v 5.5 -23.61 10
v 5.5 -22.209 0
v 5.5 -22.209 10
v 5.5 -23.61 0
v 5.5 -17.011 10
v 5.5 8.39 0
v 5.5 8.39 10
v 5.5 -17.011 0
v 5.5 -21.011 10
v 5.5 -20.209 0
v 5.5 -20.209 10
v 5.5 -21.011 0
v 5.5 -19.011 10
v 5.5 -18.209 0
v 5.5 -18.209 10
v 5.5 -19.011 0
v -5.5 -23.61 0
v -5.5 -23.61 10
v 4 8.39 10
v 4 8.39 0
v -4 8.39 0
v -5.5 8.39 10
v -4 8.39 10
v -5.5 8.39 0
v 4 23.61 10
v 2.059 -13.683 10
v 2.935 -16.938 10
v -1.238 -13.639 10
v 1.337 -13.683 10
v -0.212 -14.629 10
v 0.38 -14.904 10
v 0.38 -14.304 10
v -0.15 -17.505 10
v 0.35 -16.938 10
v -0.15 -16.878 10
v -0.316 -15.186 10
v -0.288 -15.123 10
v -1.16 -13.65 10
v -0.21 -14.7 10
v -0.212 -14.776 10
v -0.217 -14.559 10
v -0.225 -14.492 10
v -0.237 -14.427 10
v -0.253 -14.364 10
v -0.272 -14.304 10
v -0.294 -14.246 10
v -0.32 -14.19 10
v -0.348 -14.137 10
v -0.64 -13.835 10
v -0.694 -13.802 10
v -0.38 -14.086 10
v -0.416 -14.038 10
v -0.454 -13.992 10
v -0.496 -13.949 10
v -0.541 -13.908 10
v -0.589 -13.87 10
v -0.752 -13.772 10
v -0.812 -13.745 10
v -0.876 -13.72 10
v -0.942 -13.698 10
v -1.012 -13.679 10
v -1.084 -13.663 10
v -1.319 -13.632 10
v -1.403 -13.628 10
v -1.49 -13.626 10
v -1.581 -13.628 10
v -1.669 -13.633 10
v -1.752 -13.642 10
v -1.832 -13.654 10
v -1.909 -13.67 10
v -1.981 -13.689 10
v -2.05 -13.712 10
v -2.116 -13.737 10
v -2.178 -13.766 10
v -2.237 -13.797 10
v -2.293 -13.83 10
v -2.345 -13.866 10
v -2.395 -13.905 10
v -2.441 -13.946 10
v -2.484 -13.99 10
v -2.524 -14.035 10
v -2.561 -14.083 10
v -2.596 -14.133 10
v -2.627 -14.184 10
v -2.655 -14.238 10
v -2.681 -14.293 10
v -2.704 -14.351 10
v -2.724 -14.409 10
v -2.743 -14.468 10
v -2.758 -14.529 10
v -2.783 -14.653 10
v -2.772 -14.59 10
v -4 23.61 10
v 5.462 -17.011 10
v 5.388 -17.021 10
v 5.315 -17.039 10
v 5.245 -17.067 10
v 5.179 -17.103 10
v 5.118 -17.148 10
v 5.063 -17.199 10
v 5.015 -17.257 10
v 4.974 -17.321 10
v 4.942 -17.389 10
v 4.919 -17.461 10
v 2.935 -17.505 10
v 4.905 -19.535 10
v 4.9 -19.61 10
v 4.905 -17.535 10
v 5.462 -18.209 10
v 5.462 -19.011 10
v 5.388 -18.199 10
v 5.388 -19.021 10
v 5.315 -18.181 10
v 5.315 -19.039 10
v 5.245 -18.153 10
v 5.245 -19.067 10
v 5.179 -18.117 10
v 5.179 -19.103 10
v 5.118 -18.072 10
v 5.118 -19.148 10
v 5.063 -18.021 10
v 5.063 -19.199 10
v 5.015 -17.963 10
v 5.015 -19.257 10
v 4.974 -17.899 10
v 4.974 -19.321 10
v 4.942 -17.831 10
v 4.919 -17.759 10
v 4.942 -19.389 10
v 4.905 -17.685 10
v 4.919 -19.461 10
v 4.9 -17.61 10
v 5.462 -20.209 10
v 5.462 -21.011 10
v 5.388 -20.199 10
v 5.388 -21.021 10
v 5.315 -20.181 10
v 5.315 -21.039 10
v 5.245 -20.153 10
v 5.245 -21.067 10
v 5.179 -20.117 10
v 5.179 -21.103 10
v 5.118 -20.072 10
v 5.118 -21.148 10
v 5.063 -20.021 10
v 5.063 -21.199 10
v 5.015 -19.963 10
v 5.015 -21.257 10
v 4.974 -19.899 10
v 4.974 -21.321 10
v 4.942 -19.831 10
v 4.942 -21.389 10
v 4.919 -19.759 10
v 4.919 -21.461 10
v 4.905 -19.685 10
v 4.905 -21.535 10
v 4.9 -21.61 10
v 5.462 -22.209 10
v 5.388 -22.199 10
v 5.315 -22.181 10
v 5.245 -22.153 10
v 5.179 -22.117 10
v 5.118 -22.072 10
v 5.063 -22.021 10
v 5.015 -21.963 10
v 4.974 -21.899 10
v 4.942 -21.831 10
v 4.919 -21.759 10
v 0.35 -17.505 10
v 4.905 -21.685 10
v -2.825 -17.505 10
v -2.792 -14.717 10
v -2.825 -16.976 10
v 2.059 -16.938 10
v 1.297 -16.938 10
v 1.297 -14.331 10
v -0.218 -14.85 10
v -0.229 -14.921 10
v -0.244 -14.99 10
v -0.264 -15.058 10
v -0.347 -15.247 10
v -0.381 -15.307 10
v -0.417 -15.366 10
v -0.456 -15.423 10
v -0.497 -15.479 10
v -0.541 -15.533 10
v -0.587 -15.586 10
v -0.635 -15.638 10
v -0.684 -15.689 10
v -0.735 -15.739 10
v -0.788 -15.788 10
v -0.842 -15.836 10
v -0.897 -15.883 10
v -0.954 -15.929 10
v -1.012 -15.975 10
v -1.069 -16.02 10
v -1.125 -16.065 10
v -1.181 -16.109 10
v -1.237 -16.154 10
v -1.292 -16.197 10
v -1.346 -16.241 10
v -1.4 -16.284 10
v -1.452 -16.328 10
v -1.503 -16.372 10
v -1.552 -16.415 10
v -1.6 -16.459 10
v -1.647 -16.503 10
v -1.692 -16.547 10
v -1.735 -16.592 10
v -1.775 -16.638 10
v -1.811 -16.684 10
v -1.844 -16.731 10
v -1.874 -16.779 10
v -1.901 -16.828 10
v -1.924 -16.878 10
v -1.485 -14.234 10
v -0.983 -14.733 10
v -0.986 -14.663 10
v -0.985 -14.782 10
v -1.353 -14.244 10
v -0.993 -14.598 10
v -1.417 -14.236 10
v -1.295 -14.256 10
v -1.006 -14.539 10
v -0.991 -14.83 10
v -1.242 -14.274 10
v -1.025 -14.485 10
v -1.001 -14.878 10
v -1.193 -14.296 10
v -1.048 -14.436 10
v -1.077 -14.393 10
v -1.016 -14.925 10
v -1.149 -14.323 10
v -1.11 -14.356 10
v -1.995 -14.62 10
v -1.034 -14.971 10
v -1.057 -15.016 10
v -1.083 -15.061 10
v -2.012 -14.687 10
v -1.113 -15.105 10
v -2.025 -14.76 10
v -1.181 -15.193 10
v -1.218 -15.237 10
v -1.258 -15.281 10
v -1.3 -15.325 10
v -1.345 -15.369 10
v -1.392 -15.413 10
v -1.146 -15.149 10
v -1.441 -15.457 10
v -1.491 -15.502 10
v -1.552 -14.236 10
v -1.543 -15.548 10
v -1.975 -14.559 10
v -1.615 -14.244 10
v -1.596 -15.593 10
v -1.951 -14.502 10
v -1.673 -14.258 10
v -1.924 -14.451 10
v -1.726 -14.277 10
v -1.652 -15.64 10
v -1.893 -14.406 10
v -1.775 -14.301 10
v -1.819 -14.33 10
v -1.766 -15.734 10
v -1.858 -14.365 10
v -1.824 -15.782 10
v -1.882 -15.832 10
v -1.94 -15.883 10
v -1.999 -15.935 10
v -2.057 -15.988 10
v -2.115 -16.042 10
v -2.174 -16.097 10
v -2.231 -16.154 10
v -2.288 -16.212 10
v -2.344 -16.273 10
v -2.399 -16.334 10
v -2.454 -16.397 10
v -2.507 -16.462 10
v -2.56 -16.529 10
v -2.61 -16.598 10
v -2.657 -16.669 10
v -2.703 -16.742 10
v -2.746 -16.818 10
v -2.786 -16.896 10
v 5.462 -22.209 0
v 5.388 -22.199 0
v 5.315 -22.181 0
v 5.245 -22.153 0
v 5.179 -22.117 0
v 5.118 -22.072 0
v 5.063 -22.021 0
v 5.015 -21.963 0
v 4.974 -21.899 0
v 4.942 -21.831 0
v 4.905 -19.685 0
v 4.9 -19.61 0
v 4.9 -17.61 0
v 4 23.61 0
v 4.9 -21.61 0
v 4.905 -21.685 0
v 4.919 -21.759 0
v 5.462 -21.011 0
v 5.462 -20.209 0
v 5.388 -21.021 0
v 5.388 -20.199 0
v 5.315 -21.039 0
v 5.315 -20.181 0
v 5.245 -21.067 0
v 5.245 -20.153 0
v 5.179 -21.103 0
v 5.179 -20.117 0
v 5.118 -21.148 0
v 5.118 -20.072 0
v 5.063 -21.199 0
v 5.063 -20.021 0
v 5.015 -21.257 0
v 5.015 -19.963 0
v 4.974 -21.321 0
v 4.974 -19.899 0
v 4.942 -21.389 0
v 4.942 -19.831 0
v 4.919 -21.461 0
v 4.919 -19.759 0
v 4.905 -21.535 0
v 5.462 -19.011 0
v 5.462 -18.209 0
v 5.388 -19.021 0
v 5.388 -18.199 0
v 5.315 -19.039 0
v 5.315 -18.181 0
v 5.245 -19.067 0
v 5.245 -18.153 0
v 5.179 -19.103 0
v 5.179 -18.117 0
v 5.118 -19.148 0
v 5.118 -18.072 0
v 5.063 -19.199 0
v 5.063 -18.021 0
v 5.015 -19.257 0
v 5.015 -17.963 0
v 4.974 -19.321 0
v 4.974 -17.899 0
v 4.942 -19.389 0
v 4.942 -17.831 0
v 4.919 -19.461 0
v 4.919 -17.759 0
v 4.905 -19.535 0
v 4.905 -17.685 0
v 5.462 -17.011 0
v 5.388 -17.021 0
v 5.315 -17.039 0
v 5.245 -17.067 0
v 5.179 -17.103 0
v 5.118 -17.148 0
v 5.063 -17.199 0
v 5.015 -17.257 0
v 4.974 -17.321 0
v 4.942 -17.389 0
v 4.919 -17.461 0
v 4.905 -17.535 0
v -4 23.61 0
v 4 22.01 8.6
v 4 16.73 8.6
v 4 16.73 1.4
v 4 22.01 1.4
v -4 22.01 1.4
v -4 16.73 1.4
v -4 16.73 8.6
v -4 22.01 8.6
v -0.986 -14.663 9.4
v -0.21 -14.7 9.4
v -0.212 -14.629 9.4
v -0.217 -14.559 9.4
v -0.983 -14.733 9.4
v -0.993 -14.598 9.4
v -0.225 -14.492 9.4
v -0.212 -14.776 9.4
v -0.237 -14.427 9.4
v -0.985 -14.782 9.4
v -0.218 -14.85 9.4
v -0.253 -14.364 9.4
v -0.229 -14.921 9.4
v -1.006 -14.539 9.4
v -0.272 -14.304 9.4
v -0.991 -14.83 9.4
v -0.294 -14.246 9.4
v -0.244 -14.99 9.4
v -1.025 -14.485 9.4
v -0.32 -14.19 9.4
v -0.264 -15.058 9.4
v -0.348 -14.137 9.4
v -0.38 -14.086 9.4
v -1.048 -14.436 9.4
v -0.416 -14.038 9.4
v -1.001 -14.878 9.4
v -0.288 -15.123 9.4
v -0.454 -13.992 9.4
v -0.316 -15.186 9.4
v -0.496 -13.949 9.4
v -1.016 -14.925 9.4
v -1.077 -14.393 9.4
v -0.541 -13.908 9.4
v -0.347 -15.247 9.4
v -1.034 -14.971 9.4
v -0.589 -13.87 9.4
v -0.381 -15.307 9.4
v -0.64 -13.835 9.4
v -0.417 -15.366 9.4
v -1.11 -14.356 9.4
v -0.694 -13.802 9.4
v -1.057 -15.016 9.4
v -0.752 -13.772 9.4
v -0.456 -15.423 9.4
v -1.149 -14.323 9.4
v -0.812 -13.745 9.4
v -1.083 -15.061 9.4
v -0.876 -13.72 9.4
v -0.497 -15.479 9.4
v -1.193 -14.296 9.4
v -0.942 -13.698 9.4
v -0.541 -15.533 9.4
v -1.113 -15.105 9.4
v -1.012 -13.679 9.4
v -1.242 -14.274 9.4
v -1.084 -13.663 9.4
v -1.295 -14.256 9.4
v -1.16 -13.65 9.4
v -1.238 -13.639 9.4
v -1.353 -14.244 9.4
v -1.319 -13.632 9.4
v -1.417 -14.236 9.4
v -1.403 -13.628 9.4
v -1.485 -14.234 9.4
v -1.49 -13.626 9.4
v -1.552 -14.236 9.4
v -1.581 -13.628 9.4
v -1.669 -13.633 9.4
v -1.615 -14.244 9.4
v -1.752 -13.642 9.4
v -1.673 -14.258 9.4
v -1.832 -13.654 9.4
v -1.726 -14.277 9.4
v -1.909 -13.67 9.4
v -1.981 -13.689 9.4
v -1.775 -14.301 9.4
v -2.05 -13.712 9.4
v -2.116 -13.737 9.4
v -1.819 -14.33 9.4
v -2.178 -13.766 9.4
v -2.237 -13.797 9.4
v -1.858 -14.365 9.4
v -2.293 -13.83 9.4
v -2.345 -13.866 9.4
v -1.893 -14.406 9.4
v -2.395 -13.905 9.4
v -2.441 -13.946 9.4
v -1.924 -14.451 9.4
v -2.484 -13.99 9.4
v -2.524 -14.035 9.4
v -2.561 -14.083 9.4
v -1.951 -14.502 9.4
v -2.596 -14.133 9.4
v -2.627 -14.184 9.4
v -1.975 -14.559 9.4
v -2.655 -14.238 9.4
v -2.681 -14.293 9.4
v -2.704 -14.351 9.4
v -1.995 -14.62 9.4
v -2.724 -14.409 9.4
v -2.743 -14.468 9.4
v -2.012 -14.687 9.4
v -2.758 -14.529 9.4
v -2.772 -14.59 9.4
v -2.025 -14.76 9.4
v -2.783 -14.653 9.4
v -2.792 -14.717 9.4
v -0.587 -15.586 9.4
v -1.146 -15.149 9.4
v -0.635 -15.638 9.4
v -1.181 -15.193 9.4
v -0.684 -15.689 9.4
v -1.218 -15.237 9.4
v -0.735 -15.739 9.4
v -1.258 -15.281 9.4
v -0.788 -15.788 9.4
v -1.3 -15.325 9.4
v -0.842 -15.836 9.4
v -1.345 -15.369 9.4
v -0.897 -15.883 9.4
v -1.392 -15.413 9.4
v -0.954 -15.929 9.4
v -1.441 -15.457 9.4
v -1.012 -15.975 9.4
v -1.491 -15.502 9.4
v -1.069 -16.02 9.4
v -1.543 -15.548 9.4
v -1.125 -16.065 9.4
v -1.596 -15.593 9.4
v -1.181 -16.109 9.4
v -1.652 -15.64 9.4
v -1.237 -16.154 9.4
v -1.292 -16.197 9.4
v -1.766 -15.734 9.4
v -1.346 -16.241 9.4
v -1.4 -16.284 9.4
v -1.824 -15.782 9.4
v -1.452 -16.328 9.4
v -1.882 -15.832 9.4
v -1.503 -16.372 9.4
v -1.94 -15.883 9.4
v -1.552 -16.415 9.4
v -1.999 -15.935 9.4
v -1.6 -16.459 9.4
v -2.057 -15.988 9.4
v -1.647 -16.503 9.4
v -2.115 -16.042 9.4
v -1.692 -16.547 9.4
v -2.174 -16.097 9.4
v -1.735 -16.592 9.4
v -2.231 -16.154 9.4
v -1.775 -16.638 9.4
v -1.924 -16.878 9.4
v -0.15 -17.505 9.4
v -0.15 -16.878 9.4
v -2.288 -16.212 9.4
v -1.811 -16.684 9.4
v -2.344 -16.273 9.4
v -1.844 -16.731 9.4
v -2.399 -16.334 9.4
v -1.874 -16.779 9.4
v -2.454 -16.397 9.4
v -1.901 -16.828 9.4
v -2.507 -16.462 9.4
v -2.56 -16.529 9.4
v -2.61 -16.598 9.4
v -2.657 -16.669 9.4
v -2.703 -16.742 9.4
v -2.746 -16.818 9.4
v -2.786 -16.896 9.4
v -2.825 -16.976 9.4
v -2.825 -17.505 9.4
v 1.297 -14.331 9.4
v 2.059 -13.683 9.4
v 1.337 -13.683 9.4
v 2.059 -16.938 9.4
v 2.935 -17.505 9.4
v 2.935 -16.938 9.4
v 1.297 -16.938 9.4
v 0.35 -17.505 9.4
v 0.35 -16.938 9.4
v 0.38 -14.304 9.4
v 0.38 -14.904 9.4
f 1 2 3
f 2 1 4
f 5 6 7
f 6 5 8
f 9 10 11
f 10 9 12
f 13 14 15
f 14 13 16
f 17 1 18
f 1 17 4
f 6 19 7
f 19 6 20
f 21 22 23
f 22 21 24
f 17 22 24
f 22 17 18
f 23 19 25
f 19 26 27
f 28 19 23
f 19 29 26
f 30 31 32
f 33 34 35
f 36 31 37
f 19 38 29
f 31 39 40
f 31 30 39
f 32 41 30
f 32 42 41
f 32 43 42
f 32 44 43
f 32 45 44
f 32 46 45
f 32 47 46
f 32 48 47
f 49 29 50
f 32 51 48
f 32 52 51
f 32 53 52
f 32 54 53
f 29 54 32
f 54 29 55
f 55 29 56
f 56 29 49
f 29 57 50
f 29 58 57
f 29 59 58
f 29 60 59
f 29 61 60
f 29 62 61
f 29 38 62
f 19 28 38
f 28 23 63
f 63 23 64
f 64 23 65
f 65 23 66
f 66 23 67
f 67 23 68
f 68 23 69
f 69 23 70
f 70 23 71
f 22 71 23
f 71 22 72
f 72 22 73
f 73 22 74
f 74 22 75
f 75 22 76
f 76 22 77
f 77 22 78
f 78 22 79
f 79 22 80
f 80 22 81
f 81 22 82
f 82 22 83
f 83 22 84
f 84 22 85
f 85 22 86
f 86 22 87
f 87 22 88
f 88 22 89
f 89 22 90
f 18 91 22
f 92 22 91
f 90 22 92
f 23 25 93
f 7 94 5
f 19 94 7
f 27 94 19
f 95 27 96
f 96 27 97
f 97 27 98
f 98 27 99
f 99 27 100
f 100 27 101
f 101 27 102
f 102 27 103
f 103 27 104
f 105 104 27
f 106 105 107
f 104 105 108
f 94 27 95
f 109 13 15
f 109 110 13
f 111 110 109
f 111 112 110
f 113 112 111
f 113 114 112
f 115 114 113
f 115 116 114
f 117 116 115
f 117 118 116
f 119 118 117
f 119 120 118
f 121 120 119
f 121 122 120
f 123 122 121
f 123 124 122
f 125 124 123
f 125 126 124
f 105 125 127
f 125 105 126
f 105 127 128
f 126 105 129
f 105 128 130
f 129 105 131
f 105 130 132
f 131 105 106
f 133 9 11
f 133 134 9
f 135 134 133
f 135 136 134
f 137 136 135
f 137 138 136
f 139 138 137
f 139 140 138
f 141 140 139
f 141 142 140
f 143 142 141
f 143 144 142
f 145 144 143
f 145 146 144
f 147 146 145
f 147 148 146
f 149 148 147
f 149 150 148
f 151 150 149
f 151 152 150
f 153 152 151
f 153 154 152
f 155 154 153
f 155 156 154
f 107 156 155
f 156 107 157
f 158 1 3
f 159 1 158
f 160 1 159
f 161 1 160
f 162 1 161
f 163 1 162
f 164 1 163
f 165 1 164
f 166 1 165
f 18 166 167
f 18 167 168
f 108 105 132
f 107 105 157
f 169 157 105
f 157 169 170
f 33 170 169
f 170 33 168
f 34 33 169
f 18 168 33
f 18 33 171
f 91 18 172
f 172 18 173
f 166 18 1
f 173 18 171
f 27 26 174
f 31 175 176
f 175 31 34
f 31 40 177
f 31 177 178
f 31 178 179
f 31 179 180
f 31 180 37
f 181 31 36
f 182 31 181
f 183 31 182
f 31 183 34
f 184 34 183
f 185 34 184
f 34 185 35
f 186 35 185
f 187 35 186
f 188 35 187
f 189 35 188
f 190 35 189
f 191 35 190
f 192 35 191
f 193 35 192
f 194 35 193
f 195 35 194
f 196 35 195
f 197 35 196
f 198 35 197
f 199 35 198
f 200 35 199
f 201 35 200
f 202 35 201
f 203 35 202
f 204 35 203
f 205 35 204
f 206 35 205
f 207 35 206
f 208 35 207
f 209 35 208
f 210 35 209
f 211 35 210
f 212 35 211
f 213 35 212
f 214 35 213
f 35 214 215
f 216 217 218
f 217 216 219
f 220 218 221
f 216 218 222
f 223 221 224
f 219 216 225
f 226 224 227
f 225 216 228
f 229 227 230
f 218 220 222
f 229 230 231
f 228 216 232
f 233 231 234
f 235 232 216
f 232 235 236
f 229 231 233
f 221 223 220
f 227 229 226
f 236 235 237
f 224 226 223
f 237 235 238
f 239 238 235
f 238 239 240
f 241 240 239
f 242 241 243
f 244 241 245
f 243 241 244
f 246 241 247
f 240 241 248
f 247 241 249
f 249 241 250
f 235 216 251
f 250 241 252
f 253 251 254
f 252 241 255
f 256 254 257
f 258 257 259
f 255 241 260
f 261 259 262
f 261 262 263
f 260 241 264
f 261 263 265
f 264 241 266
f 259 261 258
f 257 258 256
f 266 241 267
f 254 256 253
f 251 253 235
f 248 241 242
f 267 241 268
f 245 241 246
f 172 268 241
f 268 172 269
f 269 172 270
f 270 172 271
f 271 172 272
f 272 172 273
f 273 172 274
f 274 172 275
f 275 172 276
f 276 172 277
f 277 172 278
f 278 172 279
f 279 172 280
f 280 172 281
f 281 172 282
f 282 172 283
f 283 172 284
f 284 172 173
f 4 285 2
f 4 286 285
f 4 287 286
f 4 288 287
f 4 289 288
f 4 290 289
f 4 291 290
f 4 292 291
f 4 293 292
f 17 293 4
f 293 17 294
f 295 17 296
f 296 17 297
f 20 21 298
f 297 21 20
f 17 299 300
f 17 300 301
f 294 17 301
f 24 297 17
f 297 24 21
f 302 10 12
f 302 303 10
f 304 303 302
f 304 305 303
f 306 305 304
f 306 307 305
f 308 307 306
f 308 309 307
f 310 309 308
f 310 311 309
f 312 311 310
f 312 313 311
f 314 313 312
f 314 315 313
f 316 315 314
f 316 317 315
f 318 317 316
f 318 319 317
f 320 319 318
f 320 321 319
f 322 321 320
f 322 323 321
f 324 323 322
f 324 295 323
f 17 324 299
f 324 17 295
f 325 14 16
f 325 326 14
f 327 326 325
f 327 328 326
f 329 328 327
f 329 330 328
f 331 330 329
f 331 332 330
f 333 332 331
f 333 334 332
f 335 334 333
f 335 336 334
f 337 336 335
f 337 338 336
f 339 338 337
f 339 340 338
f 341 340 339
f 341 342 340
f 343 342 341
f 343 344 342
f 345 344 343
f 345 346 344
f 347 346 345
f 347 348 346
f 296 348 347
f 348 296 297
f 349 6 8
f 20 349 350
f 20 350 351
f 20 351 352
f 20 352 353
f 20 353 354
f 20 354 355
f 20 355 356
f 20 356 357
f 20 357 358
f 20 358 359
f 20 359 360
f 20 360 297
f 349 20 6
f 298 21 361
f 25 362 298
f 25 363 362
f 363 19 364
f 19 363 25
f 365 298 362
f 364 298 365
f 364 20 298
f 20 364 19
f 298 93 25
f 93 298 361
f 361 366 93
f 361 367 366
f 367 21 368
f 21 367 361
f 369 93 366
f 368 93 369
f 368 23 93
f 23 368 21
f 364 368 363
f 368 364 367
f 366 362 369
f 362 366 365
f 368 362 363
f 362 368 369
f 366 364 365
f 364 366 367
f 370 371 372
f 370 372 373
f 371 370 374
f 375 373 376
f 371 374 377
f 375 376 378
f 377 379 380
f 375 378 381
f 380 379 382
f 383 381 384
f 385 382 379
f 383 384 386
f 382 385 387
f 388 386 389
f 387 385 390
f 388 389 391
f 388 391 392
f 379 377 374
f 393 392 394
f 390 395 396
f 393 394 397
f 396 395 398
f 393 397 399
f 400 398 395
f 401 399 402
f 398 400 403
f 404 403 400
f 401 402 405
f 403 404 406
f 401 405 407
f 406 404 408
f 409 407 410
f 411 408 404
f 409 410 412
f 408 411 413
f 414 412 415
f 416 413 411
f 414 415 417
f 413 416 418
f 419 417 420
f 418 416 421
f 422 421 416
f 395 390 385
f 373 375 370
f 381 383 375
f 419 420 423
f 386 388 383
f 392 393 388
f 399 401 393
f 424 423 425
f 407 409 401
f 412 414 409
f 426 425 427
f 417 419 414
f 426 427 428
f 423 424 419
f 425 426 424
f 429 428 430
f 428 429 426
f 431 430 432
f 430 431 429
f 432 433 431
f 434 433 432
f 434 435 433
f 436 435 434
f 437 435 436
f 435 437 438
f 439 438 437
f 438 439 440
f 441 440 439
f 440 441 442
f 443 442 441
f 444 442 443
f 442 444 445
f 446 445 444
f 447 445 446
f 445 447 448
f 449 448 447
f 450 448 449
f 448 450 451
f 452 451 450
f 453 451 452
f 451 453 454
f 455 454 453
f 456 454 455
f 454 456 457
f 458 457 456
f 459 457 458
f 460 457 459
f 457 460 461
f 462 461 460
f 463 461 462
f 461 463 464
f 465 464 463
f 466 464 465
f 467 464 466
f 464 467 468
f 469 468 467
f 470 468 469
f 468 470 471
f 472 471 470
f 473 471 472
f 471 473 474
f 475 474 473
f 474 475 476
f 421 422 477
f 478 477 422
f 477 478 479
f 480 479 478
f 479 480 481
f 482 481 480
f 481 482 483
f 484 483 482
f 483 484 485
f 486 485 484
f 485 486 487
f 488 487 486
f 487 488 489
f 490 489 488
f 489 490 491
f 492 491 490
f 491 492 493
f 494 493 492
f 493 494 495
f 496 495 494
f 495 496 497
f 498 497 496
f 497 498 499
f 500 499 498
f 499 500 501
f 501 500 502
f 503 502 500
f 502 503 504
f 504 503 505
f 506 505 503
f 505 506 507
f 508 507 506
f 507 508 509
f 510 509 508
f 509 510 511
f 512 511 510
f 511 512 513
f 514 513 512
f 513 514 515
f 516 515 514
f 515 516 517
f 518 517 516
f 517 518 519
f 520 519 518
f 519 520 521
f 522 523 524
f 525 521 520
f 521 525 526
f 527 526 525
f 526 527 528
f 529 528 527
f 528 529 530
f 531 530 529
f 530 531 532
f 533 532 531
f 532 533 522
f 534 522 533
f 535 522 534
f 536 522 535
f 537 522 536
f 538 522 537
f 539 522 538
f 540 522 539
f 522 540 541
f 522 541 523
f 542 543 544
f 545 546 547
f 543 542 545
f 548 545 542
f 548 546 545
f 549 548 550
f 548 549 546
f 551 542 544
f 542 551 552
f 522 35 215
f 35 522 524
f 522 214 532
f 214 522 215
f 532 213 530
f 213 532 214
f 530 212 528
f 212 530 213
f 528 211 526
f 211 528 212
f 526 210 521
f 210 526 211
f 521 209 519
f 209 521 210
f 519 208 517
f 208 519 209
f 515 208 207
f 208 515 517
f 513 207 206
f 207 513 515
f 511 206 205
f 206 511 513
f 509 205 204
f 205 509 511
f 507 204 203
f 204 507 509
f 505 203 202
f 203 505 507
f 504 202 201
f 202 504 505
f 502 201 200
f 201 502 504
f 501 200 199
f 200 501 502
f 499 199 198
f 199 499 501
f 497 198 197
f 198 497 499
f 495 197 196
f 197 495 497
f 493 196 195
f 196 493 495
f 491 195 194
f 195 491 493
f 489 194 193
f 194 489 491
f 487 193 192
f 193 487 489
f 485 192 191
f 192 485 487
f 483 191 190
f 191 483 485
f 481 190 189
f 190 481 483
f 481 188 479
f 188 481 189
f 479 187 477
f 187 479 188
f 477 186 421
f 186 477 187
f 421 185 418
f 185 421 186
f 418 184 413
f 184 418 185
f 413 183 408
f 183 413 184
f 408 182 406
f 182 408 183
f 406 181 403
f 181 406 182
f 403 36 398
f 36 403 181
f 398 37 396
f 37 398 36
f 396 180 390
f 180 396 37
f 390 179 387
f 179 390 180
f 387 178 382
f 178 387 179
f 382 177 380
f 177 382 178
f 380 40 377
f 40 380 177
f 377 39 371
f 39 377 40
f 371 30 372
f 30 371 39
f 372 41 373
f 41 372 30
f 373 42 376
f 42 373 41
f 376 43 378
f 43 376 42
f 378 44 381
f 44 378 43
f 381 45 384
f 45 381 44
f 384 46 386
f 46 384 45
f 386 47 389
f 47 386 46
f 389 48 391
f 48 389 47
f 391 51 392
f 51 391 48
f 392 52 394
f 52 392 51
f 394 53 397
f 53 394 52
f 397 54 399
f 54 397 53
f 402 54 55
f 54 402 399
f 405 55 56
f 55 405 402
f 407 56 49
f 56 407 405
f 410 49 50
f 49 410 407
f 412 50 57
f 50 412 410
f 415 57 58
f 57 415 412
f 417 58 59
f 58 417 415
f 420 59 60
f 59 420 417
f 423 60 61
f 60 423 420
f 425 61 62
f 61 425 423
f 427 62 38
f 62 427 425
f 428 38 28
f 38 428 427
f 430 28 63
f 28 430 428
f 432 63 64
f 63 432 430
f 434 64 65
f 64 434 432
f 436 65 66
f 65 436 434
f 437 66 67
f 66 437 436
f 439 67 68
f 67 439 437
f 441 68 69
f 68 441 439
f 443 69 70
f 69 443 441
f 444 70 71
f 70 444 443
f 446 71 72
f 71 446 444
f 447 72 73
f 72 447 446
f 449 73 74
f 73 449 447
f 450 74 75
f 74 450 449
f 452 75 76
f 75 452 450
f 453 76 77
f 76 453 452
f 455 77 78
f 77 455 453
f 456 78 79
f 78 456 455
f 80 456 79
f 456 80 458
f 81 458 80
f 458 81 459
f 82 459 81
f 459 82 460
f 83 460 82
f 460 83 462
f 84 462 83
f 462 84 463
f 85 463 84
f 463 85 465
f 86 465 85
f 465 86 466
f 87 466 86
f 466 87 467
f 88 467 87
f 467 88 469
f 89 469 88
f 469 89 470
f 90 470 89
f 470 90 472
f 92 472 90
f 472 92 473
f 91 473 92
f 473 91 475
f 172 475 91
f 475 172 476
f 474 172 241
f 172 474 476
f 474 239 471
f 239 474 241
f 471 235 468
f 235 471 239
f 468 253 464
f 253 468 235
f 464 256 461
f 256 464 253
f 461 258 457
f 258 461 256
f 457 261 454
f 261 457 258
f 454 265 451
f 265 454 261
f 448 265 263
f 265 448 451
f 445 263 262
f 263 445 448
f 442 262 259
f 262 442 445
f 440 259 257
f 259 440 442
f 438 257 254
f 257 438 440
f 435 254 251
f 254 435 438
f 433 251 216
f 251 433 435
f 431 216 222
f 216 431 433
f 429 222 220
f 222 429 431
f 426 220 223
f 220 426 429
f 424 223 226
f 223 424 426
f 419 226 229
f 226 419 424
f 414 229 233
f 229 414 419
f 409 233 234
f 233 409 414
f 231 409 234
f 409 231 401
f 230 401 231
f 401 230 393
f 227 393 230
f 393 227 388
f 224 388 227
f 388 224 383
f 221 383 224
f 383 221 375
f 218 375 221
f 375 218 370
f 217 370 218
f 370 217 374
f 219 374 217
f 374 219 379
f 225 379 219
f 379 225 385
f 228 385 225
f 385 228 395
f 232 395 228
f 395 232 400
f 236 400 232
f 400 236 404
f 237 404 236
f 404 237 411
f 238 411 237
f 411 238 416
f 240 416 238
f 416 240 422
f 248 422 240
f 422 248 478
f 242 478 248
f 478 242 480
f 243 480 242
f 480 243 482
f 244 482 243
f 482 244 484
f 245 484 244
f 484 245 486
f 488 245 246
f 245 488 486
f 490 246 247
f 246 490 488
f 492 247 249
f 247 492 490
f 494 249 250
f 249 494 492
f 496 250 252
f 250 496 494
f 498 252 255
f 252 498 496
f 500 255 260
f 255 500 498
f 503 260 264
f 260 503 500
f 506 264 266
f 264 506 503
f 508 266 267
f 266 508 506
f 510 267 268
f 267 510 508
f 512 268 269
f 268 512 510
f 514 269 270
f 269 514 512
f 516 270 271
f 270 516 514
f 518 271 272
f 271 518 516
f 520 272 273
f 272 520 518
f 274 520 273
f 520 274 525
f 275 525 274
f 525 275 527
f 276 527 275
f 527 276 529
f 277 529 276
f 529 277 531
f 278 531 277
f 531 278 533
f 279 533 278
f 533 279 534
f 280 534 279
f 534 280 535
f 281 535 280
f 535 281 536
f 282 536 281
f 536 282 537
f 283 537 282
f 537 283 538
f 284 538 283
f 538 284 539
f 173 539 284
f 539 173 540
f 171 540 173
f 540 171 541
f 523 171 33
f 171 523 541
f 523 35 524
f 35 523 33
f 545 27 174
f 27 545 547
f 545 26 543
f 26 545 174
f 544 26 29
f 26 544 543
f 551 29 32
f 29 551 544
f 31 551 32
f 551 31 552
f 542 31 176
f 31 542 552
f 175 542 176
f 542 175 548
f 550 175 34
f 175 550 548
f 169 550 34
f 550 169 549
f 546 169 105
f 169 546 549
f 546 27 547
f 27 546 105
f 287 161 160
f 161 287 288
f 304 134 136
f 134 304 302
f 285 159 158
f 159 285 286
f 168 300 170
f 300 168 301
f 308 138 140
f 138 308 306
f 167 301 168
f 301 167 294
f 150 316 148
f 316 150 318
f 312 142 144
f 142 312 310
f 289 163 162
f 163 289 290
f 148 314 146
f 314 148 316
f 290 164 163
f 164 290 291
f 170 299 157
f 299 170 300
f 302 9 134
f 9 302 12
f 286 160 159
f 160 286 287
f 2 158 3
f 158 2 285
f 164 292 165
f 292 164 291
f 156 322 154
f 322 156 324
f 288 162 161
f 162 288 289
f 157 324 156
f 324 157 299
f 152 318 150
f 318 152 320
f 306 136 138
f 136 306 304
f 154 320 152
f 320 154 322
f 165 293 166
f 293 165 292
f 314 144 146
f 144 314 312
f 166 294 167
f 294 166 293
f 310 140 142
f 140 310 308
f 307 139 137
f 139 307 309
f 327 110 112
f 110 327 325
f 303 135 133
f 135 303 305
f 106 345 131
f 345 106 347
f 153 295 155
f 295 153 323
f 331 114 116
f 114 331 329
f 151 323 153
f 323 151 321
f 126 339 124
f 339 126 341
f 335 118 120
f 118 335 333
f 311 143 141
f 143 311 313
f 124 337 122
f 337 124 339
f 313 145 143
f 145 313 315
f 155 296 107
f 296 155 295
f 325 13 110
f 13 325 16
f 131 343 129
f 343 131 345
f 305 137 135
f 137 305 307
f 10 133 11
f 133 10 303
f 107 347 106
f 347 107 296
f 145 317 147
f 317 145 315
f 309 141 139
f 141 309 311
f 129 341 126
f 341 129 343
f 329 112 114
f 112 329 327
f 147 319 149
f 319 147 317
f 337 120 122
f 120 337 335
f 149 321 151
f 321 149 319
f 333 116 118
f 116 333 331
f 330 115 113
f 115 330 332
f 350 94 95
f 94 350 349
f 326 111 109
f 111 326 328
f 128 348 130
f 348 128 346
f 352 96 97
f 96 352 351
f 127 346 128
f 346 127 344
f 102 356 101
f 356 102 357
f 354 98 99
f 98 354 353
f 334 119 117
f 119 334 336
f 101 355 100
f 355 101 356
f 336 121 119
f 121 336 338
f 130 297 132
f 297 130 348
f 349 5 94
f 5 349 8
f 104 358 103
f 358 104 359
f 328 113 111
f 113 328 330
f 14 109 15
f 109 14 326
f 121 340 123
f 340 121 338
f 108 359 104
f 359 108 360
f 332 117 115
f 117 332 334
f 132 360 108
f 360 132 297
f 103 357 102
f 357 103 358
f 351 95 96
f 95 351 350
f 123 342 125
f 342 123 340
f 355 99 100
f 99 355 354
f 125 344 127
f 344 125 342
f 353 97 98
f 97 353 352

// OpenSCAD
$fn = 50;

difference() {
	union() {
		translate(v = [0, 8.39, 0]) {
			rotate(a = [90, 0, 0]) {
				difference() {
					union() {
						translate(v = [-5.5, 0, 0]) {
							cube(size = [11.0, 10.0, 32.0]);
						}
						translate(v = [-4.0, 0, -15.22]) {
							cube(size = [8.0, 10.0, 15.32]);
						}
					}
					union() {
						translate(v = [-4.1, 1.4, -13.620000000000001]) {
							cube(size = [8.2, 7.2, 5.28]);
						}
						translate(v = [0, 9.4, 24.0]) {
							rotate(a = [-90, 0, 0]) {
								linear_extrude(height = 0.7) {
									text(font = "Arial:style=Bold", halign = "center", size = 4.0, text = "21", valign = "center");
								}
							}
						}
						translate(v = [5.5, 10.1, 30.0]) {
							rotate(a = [90, 0, 0]) {
								cylinder(h = 10.2, r = 0.6);
							}
						}
						translate(v = [5.5, 10.1, 28.0]) {
							rotate(a = [90, 0, 0]) {
								cylinder(h = 10.2, r = 0.6);
							}
						}
						translate(v = [5.5, 10.1, 26.0]) {
							rotate(a = [90, 0, 0]) {
								cylinder(h = 10.2, r = 0.6);
							}
						}
					}
				}
			}
		}
	}
	union();
}
